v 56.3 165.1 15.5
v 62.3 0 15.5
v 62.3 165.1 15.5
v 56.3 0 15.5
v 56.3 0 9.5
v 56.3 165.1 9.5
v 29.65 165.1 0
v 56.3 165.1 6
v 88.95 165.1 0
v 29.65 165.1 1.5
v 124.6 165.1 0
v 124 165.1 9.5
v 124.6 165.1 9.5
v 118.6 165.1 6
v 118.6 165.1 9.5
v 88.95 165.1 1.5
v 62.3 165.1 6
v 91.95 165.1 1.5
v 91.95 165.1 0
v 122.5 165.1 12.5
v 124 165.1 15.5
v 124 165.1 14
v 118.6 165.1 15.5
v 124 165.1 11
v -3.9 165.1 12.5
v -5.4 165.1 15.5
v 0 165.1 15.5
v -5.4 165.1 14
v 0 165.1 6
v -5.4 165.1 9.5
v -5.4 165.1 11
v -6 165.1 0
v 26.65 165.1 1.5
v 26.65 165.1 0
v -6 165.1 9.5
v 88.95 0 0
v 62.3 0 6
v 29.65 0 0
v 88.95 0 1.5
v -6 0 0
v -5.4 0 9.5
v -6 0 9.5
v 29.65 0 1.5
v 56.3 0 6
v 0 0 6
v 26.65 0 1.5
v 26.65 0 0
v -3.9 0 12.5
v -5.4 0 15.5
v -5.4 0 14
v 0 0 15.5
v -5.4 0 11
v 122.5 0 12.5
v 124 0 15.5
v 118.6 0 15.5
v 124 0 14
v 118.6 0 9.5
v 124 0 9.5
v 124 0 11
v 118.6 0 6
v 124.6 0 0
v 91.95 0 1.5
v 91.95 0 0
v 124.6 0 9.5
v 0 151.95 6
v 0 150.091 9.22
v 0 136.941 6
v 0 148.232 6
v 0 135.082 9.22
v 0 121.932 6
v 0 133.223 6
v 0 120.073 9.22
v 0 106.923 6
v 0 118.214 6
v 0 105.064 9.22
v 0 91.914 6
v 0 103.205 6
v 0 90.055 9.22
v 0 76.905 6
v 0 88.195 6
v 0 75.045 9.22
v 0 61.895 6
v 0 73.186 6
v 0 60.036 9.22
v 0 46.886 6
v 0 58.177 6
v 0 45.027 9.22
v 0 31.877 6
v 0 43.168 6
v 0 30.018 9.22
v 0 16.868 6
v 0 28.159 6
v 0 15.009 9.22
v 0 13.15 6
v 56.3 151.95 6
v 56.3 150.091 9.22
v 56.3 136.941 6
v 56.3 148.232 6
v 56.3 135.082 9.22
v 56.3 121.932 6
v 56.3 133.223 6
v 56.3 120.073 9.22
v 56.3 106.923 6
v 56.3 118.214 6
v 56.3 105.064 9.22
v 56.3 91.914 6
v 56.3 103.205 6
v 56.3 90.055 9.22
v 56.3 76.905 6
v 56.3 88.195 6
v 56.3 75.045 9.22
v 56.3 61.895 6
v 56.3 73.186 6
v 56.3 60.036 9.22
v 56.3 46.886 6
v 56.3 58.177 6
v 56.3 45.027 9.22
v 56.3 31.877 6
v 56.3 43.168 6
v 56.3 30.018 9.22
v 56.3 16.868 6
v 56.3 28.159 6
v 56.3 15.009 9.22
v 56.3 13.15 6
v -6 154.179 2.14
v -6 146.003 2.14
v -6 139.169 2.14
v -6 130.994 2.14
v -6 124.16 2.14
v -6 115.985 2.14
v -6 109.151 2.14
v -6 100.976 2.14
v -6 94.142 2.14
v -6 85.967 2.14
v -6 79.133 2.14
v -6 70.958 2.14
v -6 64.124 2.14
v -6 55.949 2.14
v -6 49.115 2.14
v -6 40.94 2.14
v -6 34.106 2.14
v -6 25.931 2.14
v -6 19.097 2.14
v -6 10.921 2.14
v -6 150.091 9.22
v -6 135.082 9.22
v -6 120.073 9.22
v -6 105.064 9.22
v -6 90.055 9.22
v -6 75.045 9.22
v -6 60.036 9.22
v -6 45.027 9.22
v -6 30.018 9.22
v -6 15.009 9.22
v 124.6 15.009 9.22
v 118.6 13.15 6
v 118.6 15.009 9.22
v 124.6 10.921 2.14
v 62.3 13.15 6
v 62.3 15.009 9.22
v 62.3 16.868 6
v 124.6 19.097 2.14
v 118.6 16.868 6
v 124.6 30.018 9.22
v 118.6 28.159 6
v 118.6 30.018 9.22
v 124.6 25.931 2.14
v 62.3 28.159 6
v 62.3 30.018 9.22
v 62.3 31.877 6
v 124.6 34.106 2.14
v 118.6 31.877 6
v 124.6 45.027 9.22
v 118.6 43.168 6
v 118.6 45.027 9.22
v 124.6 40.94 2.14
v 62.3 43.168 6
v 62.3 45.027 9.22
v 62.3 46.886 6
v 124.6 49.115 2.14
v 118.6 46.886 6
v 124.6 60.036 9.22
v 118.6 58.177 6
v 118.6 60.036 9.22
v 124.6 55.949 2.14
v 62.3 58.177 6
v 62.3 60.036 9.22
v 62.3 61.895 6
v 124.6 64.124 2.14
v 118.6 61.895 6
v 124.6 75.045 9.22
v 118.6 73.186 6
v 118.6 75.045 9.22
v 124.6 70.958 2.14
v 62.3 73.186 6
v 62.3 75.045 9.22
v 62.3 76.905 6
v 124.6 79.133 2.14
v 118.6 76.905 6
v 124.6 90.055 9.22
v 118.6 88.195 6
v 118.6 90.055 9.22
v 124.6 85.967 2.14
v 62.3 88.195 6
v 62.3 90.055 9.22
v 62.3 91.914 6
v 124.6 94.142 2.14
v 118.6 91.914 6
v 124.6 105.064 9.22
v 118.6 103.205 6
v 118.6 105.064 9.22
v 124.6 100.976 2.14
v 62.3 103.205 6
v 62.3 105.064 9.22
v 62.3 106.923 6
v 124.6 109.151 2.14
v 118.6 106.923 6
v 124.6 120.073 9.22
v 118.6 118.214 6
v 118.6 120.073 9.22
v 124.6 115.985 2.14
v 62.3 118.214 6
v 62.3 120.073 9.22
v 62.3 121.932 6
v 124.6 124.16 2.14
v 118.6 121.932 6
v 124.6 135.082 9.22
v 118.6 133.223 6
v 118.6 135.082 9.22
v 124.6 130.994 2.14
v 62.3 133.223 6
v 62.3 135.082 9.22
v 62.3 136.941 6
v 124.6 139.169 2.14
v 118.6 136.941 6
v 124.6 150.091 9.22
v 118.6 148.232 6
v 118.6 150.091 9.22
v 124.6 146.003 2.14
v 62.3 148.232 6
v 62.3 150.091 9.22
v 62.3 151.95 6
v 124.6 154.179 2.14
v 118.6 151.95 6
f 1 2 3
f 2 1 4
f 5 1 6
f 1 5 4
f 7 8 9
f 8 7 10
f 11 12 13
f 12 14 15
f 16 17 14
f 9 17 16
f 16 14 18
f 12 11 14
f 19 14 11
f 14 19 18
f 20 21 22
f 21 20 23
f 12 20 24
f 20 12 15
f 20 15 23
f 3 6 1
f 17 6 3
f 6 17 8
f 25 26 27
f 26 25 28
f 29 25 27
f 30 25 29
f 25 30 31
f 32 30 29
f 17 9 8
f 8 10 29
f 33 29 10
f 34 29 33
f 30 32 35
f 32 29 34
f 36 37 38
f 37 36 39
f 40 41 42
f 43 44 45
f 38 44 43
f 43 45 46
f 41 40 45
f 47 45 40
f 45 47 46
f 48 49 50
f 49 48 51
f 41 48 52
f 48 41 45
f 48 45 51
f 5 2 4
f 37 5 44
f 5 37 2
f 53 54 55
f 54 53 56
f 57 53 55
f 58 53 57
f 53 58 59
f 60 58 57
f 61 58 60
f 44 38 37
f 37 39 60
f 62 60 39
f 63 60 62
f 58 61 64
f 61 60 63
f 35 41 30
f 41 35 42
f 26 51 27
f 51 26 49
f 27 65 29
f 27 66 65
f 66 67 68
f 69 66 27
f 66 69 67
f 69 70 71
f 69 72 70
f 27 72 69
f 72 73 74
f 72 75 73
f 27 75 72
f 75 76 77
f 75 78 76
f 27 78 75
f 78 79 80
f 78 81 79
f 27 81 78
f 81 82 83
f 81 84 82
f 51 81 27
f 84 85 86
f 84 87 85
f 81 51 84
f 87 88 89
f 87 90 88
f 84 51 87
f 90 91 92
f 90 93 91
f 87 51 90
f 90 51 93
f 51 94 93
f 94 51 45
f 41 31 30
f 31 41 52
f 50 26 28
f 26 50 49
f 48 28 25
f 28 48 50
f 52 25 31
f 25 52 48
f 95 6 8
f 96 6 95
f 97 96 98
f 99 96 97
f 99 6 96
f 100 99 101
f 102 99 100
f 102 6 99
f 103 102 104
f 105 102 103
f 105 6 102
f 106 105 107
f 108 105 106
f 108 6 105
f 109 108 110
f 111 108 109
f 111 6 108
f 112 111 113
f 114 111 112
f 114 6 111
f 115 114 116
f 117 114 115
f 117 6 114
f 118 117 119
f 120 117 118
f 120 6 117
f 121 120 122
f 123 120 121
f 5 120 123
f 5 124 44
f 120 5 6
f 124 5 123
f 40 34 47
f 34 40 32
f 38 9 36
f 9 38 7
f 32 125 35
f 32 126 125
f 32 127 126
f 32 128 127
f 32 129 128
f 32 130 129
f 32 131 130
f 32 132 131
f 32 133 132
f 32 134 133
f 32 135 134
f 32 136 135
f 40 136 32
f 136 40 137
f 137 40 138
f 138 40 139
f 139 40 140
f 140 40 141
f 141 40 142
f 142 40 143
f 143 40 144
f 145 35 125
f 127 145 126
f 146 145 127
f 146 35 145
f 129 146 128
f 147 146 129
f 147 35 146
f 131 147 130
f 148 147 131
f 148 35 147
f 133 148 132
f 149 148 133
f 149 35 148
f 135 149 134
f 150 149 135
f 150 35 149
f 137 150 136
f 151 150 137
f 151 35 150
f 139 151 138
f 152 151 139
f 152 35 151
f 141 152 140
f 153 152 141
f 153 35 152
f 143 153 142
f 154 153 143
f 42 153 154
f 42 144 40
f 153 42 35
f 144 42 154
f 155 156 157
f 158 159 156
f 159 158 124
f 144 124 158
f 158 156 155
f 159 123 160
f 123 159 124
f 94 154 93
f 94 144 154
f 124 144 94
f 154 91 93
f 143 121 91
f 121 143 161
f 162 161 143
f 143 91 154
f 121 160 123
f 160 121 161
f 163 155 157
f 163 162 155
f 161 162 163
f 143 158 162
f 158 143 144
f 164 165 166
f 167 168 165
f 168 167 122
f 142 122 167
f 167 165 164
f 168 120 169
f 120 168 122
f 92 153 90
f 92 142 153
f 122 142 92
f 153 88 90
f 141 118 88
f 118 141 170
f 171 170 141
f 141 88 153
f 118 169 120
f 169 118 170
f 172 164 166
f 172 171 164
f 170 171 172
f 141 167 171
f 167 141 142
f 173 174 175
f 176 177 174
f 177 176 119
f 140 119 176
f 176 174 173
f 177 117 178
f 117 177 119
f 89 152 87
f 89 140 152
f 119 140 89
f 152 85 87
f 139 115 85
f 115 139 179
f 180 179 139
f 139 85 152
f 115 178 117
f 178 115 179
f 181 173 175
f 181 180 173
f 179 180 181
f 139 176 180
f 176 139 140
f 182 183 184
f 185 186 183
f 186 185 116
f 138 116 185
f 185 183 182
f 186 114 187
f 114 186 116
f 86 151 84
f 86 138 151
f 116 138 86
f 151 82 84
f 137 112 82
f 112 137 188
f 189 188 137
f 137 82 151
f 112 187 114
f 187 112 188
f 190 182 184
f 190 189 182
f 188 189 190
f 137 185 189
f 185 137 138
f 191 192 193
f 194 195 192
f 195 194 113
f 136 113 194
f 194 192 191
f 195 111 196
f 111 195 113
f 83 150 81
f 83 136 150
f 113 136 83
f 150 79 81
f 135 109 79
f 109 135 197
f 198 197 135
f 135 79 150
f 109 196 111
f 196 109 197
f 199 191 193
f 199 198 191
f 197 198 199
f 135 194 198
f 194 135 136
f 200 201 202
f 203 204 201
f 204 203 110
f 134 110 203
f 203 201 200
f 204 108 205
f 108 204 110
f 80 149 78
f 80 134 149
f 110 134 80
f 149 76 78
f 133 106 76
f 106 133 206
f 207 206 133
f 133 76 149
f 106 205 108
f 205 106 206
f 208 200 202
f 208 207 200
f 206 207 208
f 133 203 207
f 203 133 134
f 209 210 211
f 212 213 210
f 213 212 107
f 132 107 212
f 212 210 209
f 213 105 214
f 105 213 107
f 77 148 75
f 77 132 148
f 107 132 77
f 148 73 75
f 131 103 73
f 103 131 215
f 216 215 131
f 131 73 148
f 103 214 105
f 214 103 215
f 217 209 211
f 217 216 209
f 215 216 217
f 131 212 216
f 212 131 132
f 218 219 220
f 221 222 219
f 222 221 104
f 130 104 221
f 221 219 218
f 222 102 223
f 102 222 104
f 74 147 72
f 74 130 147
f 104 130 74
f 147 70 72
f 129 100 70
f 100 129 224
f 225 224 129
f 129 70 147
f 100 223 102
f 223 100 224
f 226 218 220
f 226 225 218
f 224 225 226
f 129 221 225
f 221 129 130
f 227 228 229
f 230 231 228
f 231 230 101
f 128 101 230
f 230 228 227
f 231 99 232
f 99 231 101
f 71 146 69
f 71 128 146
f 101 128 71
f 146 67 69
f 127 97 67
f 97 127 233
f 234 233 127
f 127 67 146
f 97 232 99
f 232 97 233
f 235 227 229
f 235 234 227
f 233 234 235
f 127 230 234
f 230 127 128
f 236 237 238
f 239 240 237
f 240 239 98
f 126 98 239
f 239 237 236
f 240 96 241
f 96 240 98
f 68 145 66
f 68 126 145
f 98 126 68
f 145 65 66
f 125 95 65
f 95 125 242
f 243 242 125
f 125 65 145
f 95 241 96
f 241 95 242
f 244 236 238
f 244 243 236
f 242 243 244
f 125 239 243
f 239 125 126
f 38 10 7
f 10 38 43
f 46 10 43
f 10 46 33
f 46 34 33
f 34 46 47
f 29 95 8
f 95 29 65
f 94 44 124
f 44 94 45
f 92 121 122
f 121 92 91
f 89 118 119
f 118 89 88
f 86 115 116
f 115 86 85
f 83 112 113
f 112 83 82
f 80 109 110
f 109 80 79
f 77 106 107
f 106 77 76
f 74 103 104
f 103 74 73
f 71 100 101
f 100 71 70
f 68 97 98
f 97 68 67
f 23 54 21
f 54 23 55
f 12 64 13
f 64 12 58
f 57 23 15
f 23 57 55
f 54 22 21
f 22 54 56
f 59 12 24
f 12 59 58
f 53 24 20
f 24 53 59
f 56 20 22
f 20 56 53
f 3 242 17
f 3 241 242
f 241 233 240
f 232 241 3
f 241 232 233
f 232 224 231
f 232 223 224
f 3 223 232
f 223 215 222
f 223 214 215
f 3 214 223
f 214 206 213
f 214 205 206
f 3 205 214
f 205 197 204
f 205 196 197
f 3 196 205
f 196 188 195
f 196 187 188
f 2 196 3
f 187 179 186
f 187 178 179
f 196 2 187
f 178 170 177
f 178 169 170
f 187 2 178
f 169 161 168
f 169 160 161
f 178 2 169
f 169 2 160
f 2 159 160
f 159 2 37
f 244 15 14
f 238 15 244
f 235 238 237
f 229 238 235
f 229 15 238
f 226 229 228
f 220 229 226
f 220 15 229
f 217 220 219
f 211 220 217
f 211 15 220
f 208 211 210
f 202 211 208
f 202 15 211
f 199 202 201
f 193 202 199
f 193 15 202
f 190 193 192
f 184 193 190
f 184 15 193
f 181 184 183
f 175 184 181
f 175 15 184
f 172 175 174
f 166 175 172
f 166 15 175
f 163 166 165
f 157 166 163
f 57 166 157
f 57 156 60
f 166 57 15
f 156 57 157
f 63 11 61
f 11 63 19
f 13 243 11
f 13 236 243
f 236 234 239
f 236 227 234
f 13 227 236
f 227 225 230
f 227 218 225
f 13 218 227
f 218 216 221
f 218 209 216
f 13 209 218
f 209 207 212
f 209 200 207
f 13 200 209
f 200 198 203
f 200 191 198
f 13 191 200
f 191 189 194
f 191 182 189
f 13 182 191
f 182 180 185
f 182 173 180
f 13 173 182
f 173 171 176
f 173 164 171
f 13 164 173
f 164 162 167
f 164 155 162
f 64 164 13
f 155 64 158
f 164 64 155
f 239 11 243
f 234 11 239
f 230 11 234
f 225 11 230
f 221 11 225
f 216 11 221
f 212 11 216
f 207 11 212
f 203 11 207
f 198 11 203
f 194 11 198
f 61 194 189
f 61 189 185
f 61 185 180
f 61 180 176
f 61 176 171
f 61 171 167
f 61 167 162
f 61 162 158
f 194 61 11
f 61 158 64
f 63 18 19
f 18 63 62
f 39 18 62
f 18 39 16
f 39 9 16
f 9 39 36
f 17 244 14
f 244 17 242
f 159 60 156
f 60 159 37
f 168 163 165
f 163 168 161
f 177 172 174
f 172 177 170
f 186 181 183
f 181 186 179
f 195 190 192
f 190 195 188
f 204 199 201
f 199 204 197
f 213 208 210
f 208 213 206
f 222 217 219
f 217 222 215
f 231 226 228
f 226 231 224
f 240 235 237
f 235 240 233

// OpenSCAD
$fn=60;

t=3;    // Thickness
tt=t+t; // Thickness * 2

breadboardWidth=56.3;
breadboardLength=165.1;
breadboardHeight=9.6;

rodWidth=8;
rodLength=breadboardWidth*1.2;

baseHeight=8;


module rod (rodWidth, rodLength) {
  rotate([60,0,0]) rotate([0, 90, 0])
    cylinder(h=rodLength, r=rodWidth/2, $fn=3);
}


module outerJaw (length) {
  difference () {
    cube([tt, length, tt]);
    translate([tt*0.9,0,0])
      cube([tt, length, tt]);
    translate([t*1.3, 0, t])
      rotate([0,45,0])
      cube([tt, length, tt]);
  }
}

module jawAssembly () {
  union() {
    translate([0, breadboardLength*0.025/2, tt])
      outerJaw(breadboardLength*0.89/2);
    
    translate([0, breadboardLength*0.025/2, -1.4])
      union() {
      difference() {
        cube([tt*0.9, breadboardLength*0.89/2, tt+1.4]);
        translate([0, 0.5, 0])
          translate([-2, breadboardLength/11*3 - t*3 +1, tt*0.9]) // -3 for lazy
          rotate([45,0,0])
          rotate([180,0,0])
          cube([tt+4, tt+2, tt+2]);
      }
      
      translate([0, -3.15, 0])
        translate([t, breadboardLength/11*3 -tt*0.75, 0]) // -3 for lazy
        cylinder(r1=t*1.5/2, r2=t*0.4, h=tt);
      
      translate([t,-2,0])
        cylinder(r=4, h=0.6);
      translate([t, breadboardLength*0.89/2+2,0])
        cylinder(r=4, h=0.6);
    }
    
    translate([tt*0.9, -3, 1])  // Why is this 1mm?
      difference() {
      union() {
        translate([0, -3.15, 0])
          translate([-1, breadboardLength/11*1, -0.4]) // 0.24 is too magic
          union() {
          rod(rodWidth, rodLength);
          translate([rodLength+3.5, 0, -2]) // 0.24 is too magic
            cylinder(r=4, h=0.6);
        }

        translate([0, -3.15, 0])
          translate([-1, breadboardLength/11*4, -0.4])      
          union() {
          rod(rodWidth, rodLength);
          translate([rodLength+3.5, 0, -2]) // 0.24 is too magic
            cylinder(r=4, h=0.6);
        }
      }
      translate([0, 0, 1.5])
        cube([breadboardLength, rodLength, 4]);
    }
  }

}

module base () {
  union() {
    difference() {

      union() {
        cube([breadboardWidth, breadboardLength, baseHeight]);
      
        translate([breadboardWidth, 0, tt+3.5])
          outerJaw(breadboardLength);
        translate([breadboardWidth, 0, 0])
          cube([tt, breadboardLength, tt+3.5]);

        translate([0, 0, tt*2+3.5])  //  Too much magic because of the 3 sided cylinders
          rotate([0, 180,0])
          outerJaw(breadboardLength);
        translate([-tt, 0, 0])
          cube([tt, breadboardLength, tt+3.5]);
      }

      translate([(breadboardWidth-t)/2, 0, 0])
        cube([t, breadboardLength, t/2]);
        
      translate([t, t, tt])
        cube([breadboardWidth-tt, breadboardLength-tt, breadboardHeight]);

      translate([0, 0, tt])
        cube([breadboardWidth, breadboardLength, breadboardHeight]);

    
      for (i= [1:10]) {
        translate([-tt-1, breadboardLength/11*i, t*1.5])
          rod(rodWidth*1.18, 2+rodLength+tt*2);
      }
    }
  }
}

module doubleWideBase() {
  base();
  translate([breadboardWidth+tt,0,0])
  base();
  
}

//base();

//jawAssembly();

doubleWideBase();
